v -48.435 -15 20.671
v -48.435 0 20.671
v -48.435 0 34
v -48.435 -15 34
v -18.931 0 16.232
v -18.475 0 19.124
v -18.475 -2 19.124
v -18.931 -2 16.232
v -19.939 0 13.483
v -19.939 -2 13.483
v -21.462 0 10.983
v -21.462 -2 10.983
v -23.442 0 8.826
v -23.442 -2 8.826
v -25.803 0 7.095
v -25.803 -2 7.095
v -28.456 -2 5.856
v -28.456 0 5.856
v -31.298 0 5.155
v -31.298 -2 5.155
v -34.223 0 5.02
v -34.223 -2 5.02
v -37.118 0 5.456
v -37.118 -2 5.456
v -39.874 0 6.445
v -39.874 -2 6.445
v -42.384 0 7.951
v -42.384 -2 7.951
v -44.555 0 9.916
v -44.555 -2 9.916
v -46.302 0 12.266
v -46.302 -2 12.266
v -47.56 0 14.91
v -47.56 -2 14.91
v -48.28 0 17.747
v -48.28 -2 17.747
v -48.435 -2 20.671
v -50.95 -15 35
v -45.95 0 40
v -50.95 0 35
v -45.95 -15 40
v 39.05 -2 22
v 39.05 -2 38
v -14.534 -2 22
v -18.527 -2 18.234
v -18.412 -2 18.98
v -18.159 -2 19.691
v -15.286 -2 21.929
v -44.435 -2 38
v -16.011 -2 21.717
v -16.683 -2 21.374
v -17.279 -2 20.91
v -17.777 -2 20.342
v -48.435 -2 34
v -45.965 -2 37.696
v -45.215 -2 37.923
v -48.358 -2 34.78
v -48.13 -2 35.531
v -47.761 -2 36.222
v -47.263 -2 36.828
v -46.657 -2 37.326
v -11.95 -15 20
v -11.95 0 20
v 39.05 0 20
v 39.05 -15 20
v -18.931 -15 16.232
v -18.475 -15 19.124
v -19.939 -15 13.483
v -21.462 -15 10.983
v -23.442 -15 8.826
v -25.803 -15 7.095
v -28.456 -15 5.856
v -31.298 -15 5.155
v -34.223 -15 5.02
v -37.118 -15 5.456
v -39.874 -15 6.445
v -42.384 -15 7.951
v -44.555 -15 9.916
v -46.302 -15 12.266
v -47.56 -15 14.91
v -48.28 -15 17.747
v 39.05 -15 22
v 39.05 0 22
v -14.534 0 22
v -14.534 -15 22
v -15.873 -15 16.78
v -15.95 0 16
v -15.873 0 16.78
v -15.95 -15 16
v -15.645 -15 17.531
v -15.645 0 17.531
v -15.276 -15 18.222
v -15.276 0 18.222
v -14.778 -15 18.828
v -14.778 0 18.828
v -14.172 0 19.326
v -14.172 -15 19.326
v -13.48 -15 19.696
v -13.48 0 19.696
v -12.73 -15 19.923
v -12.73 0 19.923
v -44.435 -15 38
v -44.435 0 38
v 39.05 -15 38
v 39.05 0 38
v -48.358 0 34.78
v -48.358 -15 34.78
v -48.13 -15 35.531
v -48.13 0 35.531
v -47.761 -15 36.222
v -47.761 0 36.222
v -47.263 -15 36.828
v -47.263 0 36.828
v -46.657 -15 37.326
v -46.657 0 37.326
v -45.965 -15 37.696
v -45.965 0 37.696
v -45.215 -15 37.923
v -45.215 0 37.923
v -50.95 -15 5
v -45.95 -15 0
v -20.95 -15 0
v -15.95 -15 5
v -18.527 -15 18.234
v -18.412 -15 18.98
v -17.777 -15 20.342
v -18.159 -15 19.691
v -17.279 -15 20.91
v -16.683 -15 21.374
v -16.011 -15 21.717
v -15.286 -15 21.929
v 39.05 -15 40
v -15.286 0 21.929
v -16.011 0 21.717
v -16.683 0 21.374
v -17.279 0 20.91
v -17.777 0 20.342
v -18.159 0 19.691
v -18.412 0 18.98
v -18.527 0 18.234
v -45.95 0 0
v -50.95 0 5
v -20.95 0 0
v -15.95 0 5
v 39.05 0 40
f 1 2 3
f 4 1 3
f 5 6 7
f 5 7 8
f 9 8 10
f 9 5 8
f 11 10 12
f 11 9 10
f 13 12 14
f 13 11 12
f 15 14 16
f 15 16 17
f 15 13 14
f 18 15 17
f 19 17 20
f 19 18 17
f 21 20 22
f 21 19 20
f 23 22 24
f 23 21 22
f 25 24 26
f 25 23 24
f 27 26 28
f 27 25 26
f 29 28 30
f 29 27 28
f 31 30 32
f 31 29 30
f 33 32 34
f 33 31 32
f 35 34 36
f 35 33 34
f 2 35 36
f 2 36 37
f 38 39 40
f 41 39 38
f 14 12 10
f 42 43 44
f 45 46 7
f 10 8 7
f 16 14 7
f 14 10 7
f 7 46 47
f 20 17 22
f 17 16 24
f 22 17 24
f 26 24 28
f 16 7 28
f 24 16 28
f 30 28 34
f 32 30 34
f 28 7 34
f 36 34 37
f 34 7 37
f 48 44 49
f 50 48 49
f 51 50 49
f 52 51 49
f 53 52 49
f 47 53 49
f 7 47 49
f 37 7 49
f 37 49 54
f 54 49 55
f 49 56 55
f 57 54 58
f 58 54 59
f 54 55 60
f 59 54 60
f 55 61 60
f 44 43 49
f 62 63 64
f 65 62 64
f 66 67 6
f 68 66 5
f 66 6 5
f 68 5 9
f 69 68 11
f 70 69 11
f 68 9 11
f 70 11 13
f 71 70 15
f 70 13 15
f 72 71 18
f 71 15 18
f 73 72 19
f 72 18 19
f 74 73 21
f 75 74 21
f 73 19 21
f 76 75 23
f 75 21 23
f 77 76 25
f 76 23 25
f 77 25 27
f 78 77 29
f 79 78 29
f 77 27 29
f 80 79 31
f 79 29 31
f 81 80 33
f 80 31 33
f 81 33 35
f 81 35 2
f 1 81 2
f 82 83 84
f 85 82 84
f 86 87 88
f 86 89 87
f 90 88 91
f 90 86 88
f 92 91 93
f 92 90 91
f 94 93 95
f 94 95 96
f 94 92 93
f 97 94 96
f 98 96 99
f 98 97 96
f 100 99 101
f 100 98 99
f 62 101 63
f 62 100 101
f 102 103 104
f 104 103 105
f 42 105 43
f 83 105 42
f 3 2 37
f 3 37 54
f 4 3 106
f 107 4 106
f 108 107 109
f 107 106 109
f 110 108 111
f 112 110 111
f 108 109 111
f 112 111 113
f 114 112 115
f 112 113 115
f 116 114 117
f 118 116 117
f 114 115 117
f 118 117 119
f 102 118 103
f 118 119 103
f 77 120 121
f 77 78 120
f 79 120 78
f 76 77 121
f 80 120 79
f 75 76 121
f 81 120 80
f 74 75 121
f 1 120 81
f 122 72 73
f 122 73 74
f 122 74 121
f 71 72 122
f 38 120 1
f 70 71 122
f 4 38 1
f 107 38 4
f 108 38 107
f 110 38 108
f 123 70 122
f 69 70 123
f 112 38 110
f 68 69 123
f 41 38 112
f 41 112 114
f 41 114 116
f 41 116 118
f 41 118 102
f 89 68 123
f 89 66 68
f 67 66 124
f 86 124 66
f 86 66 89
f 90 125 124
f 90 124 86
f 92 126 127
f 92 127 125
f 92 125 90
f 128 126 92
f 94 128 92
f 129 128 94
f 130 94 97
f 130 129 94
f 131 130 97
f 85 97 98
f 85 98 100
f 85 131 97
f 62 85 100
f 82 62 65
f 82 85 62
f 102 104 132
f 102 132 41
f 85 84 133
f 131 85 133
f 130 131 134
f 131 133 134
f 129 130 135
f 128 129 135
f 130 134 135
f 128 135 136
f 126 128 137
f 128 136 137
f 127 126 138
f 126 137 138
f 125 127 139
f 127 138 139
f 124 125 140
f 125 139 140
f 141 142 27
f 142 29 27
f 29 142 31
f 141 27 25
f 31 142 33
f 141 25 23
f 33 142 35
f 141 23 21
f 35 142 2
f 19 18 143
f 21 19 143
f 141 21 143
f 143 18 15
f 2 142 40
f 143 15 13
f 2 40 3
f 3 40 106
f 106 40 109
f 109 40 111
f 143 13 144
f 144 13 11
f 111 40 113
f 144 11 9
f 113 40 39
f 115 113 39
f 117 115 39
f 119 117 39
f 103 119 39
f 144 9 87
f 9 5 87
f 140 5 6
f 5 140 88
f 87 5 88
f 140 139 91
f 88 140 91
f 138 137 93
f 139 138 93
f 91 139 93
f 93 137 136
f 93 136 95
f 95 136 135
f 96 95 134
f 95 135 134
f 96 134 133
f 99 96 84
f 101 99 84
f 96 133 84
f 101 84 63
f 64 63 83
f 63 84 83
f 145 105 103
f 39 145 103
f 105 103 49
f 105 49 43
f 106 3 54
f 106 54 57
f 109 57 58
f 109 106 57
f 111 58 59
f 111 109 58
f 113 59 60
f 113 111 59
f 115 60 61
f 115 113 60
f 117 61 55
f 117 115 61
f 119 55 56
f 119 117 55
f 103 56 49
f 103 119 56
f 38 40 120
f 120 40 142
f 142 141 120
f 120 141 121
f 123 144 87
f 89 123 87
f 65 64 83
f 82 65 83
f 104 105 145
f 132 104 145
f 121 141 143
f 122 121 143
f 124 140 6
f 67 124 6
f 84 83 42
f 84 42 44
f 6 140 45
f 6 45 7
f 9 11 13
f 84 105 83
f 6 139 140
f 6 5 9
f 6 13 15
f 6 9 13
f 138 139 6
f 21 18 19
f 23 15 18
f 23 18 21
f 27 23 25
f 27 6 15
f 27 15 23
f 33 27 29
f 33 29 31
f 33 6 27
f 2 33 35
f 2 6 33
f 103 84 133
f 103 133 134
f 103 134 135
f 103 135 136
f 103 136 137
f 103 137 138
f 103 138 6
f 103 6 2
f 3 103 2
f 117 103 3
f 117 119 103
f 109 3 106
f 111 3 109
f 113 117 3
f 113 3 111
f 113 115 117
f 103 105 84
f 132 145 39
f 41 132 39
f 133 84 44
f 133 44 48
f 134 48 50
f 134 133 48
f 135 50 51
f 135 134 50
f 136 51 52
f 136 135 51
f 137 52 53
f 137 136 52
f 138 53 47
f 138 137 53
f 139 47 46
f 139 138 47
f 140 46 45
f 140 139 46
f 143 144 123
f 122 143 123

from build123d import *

# Parameters (mm, degrees)
F1_DEPTH = 15
F3_DEPTH = 2
F4_SIZE  = 5
F5_R     = 4


with BuildPart() as f1:
    # F0 (on Front) → F1 (new body)
    with BuildSketch(Plane.XZ):
        with BuildLine():
            Line((-50.949716, 40), (-50.949716, 0))
            Line((-50.949716, 0), (-15.949716, 0))
            Line((-15.949716, 0), (-15.949716, 20))
            Line((-15.949716, 20), (39.050284, 20))
            Line((39.050284, 20), (39.050284, 22))
            Line((39.050284, 22), (-14.53422, 22))
            ThreePointArc((-14.53422, 22), (-17.278835, 20.909826), (-18.527396, 18.233544))
            Line((-18.527396, 18.233544), (-18.475305, 19.124211))
            ThreePointArc((-18.475305, 19.124211), (-34.223126, 5.019952), (-48.434701, 20.670995))
            Line((-48.434701, 20.670995), (-48.434701, 34))
            ThreePointArc((-48.434701, 34), (-47.263128, 36.828427), (-44.434701, 38))
            Line((-44.434701, 38), (39.050284, 38))
            Line((39.050284, 38), (39.050284, 40))
            Line((39.050284, 40), (-50.949716, 40))
        make_face()
    extrude(amount=F1_DEPTH)

    # F4
    f4_edges = [f1.edges().sort_by_distance(p)[0] for p in [
        (-50.949716, -7.5, 0),
        (-15.949716, -7.5, 0),
        (-50.949716, -7.5, 40),
    ]]
    chamfer(f4_edges, length=F4_SIZE)

    # F5
    f5_edges = [f1.edges().sort_by_distance(p)[0] for p in [
        (-15.949716, -7.5, 20),
    ]]
    fillet(f5_edges, radius=F5_R)


with BuildPart() as f3:
    # F2 (on face) → F3 (new body)
    with BuildSketch(Plane(origin=(0, 0, 0), x_dir=(-1, 0, 0), z_dir=(0, 1, 0))):
        with BuildLine():
            Line((-39.050284, 38), (-39.050284, 22))
            Line((-39.050284, 22), (14.53422, 22))
            ThreePointArc((14.53422, 22), (17.278835, 20.909826), (18.527396, 18.233544))
            Line((18.527396, 18.233544), (18.475305, 19.124211))
            ThreePointArc((18.475305, 19.124211), (34.223126, 5.019952), (48.434701, 20.670995))
            Line((48.434701, 20.670995), (48.434701, 34))
            ThreePointArc((48.434701, 34), (47.263128, 36.828427), (44.434701, 38))
            Line((44.434701, 38), (-39.050284, 38))
        make_face()
    extrude(amount=-F3_DEPTH)


solid = Compound([f1.part, f3.part])
